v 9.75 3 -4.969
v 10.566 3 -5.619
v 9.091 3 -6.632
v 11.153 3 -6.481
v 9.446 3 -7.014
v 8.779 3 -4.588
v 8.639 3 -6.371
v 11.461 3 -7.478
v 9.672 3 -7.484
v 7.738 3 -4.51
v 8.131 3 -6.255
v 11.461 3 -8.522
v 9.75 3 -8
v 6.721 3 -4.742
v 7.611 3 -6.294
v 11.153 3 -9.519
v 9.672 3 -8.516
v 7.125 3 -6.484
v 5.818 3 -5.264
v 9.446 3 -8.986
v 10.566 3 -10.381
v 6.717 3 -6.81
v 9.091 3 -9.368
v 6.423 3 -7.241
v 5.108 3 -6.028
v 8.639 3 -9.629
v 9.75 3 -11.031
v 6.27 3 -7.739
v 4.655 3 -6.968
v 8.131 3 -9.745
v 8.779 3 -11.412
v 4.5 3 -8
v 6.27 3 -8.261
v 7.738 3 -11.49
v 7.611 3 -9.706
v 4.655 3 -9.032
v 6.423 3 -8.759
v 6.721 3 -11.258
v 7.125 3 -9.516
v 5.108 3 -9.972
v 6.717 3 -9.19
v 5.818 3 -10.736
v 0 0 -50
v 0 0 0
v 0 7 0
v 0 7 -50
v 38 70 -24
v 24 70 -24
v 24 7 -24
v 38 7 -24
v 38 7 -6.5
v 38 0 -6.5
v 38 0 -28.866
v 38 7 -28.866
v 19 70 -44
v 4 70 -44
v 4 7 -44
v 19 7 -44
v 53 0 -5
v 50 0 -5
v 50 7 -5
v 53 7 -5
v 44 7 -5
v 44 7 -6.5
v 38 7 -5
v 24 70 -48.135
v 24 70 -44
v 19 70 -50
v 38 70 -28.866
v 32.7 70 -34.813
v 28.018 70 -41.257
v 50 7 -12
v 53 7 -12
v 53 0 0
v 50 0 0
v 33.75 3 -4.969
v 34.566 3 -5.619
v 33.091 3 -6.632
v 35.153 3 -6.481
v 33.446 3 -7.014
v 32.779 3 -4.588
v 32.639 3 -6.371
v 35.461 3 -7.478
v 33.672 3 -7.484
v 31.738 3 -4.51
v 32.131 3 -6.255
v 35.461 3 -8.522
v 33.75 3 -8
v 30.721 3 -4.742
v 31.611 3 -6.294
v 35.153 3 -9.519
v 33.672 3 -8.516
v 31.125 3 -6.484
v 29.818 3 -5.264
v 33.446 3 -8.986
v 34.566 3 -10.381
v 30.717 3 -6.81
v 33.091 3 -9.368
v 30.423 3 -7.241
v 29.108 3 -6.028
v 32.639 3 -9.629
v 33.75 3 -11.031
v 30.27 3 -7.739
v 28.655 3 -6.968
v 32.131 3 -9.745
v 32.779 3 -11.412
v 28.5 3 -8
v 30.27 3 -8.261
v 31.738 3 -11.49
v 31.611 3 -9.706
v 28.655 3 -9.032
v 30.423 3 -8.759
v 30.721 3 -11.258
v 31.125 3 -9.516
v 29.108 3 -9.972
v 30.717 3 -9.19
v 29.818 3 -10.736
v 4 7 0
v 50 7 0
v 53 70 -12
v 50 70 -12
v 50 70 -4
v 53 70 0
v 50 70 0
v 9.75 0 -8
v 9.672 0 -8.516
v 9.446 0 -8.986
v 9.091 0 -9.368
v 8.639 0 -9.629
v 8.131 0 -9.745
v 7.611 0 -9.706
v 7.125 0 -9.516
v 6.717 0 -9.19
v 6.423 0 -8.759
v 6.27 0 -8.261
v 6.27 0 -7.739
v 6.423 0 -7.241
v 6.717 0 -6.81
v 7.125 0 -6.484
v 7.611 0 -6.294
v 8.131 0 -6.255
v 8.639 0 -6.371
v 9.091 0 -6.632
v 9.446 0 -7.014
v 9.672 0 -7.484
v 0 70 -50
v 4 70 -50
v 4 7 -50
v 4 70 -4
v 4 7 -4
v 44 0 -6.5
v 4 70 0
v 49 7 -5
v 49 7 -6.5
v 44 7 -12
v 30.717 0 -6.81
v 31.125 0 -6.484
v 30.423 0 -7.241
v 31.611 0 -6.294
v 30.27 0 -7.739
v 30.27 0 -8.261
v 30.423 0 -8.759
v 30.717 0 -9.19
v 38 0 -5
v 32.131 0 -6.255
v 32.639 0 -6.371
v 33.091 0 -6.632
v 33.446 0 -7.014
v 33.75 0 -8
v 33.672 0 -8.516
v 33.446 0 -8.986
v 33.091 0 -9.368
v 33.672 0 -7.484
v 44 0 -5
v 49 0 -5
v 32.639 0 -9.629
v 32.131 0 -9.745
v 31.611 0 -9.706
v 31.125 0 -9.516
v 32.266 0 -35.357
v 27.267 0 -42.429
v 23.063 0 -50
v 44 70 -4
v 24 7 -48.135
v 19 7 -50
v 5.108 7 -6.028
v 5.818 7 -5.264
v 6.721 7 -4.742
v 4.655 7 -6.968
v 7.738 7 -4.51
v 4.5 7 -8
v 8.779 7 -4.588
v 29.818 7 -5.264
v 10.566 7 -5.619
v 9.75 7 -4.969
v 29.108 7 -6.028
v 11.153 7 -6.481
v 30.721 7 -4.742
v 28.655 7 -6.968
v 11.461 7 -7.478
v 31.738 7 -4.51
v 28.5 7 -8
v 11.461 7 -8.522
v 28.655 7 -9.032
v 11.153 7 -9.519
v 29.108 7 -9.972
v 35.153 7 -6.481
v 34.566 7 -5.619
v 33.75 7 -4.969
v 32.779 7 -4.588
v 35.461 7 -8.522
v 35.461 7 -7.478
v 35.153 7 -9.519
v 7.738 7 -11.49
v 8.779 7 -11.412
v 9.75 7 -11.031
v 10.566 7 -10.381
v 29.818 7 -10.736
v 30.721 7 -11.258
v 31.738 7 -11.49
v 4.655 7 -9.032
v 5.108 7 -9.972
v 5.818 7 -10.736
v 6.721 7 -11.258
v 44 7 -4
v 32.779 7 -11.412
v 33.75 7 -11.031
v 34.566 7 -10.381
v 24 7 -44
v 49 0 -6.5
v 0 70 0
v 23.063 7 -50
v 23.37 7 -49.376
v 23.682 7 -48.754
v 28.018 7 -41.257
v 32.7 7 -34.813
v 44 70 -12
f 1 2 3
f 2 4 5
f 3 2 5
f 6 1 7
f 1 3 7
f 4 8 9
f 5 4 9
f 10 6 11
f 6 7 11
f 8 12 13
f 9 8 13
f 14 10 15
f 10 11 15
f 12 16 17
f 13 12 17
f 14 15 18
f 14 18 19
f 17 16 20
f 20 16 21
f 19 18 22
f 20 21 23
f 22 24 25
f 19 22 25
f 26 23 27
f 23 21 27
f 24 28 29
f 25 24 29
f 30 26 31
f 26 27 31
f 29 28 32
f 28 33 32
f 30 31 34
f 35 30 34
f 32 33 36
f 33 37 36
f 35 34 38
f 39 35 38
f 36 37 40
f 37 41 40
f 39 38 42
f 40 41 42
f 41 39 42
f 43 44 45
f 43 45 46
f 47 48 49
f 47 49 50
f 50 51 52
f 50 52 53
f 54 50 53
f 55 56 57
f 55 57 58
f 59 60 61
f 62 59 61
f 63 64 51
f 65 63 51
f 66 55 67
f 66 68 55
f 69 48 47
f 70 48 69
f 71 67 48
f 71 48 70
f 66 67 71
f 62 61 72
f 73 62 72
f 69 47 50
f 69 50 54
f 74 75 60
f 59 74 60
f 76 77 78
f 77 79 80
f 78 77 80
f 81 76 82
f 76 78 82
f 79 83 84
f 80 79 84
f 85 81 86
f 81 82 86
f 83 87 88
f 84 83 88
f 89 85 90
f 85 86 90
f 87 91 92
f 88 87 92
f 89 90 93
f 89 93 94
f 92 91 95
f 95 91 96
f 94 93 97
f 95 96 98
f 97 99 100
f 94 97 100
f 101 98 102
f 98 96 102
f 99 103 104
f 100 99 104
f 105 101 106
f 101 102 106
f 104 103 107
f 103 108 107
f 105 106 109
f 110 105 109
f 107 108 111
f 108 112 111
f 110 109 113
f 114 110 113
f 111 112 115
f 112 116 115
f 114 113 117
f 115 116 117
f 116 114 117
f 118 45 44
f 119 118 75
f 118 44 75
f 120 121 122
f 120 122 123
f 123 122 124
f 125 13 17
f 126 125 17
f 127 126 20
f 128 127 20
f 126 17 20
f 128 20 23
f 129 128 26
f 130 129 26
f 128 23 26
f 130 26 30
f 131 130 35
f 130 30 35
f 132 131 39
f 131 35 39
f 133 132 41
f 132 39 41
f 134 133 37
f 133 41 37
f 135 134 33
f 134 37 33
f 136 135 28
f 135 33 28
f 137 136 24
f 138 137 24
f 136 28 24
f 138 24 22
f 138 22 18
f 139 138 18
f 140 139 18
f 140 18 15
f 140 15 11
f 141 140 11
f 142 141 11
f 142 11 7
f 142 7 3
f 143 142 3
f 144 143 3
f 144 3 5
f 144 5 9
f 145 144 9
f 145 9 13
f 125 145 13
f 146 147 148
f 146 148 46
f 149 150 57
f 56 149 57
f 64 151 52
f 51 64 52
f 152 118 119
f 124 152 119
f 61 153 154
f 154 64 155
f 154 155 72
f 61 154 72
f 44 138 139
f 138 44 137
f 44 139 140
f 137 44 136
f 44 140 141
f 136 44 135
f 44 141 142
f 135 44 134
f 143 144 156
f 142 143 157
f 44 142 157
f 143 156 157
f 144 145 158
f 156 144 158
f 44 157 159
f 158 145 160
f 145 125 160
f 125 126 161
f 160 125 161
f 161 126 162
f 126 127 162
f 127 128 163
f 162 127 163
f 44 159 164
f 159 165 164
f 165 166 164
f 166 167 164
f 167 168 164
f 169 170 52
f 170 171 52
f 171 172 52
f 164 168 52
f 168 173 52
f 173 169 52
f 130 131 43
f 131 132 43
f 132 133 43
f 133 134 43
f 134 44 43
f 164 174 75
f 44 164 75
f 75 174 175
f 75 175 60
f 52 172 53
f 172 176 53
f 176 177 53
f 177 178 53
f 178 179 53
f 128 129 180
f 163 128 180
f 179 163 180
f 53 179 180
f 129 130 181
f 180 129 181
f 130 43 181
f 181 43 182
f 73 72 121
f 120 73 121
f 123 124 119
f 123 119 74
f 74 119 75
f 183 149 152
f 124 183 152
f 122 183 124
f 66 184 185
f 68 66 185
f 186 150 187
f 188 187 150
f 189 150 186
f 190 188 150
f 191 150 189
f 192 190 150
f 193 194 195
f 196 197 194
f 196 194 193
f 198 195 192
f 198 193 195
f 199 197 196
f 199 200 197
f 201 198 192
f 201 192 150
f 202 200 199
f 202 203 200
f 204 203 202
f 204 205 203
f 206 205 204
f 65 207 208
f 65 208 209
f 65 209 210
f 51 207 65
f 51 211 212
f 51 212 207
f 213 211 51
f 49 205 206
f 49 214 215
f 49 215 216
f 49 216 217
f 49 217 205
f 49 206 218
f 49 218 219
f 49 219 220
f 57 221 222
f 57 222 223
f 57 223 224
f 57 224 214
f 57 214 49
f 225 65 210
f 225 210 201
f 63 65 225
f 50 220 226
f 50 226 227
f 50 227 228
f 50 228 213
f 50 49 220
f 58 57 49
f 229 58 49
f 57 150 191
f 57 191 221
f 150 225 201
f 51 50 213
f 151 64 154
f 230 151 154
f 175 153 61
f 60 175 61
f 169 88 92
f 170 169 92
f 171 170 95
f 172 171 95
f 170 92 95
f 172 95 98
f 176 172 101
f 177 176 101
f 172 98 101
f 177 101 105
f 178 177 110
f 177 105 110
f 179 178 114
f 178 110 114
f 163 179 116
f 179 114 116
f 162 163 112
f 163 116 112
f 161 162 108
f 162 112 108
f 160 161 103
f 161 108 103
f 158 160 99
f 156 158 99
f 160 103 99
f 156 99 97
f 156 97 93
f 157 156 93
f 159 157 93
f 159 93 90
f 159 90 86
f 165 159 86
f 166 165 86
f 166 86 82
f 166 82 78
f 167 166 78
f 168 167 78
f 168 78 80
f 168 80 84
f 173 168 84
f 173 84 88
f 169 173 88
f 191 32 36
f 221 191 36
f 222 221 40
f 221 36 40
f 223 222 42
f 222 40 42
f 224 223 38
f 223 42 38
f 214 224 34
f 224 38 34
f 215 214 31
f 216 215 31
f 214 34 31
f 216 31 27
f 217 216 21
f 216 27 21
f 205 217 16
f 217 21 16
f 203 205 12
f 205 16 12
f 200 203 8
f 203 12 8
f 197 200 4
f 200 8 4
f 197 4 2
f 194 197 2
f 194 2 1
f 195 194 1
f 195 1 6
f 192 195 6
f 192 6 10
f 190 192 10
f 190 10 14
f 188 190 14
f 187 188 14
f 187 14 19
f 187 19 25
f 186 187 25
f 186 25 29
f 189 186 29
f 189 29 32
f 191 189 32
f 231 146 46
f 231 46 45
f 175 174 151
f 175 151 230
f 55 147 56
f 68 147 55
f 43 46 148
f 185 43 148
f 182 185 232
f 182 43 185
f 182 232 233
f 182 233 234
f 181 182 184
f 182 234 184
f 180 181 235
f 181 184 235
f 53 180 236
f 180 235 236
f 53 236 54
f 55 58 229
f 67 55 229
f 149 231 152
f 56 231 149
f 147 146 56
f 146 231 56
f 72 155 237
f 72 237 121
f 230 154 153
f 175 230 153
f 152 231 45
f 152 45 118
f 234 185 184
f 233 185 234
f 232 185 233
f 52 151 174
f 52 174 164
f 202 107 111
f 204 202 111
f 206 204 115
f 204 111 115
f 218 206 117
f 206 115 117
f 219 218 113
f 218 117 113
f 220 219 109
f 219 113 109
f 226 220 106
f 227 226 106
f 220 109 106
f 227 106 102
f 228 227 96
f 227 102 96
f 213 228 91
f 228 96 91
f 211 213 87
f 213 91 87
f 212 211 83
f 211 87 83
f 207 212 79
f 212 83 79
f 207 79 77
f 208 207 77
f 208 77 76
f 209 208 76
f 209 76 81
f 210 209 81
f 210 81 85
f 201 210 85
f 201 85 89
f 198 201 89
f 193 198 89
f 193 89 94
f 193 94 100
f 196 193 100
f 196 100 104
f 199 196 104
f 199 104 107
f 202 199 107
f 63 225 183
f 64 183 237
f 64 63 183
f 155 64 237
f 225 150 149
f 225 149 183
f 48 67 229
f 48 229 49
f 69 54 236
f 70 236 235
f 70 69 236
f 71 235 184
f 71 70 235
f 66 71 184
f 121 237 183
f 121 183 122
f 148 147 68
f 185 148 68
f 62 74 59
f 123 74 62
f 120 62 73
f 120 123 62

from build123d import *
from build123d.topology import SkipClean

# Parameters (mm, degrees)
SKETCH_1_W          = 50
SKETCH_1_H          = 50
EXTRUDE_1_DEPTH     = 7
SKETCH_2_R          = 80
CUT_EXTRUDE_1_DEPTH = 10
SKETCH_3_W          = 22
SKETCH_3_H          = 30
CUT_EXTRUDE_2_DEPTH = 10
HOLE_WIZARD_1_D     = 3.5
HOLE_WIZARD_2_D     = 7
HOLE_WIZARD_2_DEPTH = 4
EXTRUDE_START       = 63
SKETCH_9_W          = 15
SKETCH_9_H          = 6
SKETCH_9_W_2        = 46
SKETCH_9_H_2        = 4
EXTRUDE_2_DEPTH     = 63
SKETCH_10_W         = 6
SKETCH_10_H         = 8
EXTRUDE_3_DEPTH     = 63
SKETCH_11_W         = 5
SKETCH_11_H         = 1.5
EXTRUDE_4_DEPTH     = 7
EXTRUDE_5_DEPTH     = 3
SKETCH_13_W         = 6
SKETCH_13_H         = 1.5
EXTRUDE_6_DEPTH     = 7
EXTRUDE_7_DEPTH     = 63


with BuildPart() as part:
    # 草图1 → 凸台-拉伸1 (new body)
    with BuildSketch(Plane(origin=(0, 0, 0), x_dir=(1, 0, 0), z_dir=(0, 1, 0))):
        with Locations((25, 25)):
            Rectangle(SKETCH_1_W, SKETCH_1_H)
    extrude(amount=EXTRUDE_1_DEPTH)

    # 草图2 → 切除-拉伸1 (cut)
    with BuildSketch(Plane(origin=(0, 7, 0), x_dir=(1, 0, 0), z_dir=(0, 1, 0))):
        with Locations((95, 85)):
            Circle(SKETCH_2_R)
    extrude(amount=-CUT_EXTRUDE_1_DEPTH, mode=Mode.SUBTRACT)

    # 草图3 → 切除-拉伸2 (cut)
    with BuildSketch(Plane(origin=(0, 7, 0), x_dir=(1, 0, 0), z_dir=(0, 1, 0))):
        with Locations((49, 20)):
            Rectangle(SKETCH_3_W, SKETCH_3_H)
    extrude(amount=-CUT_EXTRUDE_2_DEPTH, mode=Mode.SUBTRACT)

    # 孔1 (through all)
    with Locations(Plane(origin=(0, 0, 0), x_dir=(-1, 0, 0), z_dir=(0, -1, 0))):
        with Locations((-32, 8), (-8, 8)):
            Hole(HOLE_WIZARD_1_D / 2)

    # 孔2
    with Locations(Plane(origin=(0, 7, 0), x_dir=(1, 0, 0), z_dir=(0, 1, 0))):
        with Locations((8, 8), (32, 8)):
            Hole(HOLE_WIZARD_2_D / 2, depth=HOLE_WIZARD_2_DEPTH)

    # 草图9 → 凸台-拉伸2 (add)
    with SkipClean():  # the faces are left unmerged after this step: merging them gives an invalid solid
        with BuildSketch(Plane(origin=(0, 7, 0), x_dir=(1, 0, 0), z_dir=(0, 1, 0)).offset(EXTRUDE_START)):
            with Locations((11.5, 47)):
                Rectangle(SKETCH_9_W, SKETCH_9_H)
            Polygon((0, 50), (0, 0), (4, 0), (4, 4), (4, 44), (4, 50), align=None)
            with Locations((27, 2)):
                Rectangle(SKETCH_9_W_2, SKETCH_9_H_2)
            with BuildLine():
                ThreePointArc((38, 28.866231197), (30.278867045, 37.976867938), (24, 48.135382818))
                Line((24, 48.135382818), (24, 24))
                Line((24, 24), (38, 24))
                Line((38, 24), (38, 28.866231197))
            make_face()
        extrude(amount=-EXTRUDE_2_DEPTH)

    # 草图10 → 凸台-拉伸3 (add)
    with SkipClean():  # the faces are left unmerged after this step: merging them gives an invalid solid
        with BuildSketch(Plane(origin=(0, 7, 0), x_dir=(1, 0, 0), z_dir=(0, 1, 0))):
            with Locations((47, 8)):
                Rectangle(SKETCH_10_W, SKETCH_10_H)
        extrude(amount=EXTRUDE_3_DEPTH)

    # 草图11 → 凸台-拉伸4 (add)
    with SkipClean():  # the faces are left unmerged after this step: merging them gives an invalid solid
        with BuildSketch(Plane.XZ.offset(-7)):
            with Locations((46.5, -5.75)):
                Rectangle(SKETCH_11_W, SKETCH_11_H)
        extrude(amount=EXTRUDE_4_DEPTH)

    # 草图12 → 凸台-拉伸5 (add)
    with SkipClean():  # the faces are left unmerged after this step: merging them gives an invalid solid
        with BuildSketch(Plane(origin=(50, 0, 0), x_dir=(0, 0, -1), z_dir=(1, 0, 0))):
            Polygon((5, 7), (12, 7), (12, 70), (0, 70), (0, 0), (5, 0), align=None)
        extrude(amount=EXTRUDE_5_DEPTH)

    # 草图13 → 凸台-拉伸6 (add)
    with SkipClean():  # the faces are left unmerged after this step: merging them gives an invalid solid
        with BuildSketch(Plane(origin=(0, 0, 0), x_dir=(-1, 0, 0), z_dir=(0, -1, 0))):
            with Locations((-41, 5.75)):
                Rectangle(SKETCH_13_W, SKETCH_13_H)
        extrude(amount=-EXTRUDE_6_DEPTH)

    # 草图15 → 凸台-拉伸7 (add)
    with SkipClean():  # the faces are left unmerged after this step: merging them gives an invalid solid
        with BuildSketch(Plane(origin=(0, 7, 0), x_dir=(1, 0, 0), z_dir=(0, 1, 0))):
            Polygon((19, 44), (24, 44), (24, 48.135382818), (19, 50), align=None)
        extrude(amount=EXTRUDE_7_DEPTH)


solid = part.part
